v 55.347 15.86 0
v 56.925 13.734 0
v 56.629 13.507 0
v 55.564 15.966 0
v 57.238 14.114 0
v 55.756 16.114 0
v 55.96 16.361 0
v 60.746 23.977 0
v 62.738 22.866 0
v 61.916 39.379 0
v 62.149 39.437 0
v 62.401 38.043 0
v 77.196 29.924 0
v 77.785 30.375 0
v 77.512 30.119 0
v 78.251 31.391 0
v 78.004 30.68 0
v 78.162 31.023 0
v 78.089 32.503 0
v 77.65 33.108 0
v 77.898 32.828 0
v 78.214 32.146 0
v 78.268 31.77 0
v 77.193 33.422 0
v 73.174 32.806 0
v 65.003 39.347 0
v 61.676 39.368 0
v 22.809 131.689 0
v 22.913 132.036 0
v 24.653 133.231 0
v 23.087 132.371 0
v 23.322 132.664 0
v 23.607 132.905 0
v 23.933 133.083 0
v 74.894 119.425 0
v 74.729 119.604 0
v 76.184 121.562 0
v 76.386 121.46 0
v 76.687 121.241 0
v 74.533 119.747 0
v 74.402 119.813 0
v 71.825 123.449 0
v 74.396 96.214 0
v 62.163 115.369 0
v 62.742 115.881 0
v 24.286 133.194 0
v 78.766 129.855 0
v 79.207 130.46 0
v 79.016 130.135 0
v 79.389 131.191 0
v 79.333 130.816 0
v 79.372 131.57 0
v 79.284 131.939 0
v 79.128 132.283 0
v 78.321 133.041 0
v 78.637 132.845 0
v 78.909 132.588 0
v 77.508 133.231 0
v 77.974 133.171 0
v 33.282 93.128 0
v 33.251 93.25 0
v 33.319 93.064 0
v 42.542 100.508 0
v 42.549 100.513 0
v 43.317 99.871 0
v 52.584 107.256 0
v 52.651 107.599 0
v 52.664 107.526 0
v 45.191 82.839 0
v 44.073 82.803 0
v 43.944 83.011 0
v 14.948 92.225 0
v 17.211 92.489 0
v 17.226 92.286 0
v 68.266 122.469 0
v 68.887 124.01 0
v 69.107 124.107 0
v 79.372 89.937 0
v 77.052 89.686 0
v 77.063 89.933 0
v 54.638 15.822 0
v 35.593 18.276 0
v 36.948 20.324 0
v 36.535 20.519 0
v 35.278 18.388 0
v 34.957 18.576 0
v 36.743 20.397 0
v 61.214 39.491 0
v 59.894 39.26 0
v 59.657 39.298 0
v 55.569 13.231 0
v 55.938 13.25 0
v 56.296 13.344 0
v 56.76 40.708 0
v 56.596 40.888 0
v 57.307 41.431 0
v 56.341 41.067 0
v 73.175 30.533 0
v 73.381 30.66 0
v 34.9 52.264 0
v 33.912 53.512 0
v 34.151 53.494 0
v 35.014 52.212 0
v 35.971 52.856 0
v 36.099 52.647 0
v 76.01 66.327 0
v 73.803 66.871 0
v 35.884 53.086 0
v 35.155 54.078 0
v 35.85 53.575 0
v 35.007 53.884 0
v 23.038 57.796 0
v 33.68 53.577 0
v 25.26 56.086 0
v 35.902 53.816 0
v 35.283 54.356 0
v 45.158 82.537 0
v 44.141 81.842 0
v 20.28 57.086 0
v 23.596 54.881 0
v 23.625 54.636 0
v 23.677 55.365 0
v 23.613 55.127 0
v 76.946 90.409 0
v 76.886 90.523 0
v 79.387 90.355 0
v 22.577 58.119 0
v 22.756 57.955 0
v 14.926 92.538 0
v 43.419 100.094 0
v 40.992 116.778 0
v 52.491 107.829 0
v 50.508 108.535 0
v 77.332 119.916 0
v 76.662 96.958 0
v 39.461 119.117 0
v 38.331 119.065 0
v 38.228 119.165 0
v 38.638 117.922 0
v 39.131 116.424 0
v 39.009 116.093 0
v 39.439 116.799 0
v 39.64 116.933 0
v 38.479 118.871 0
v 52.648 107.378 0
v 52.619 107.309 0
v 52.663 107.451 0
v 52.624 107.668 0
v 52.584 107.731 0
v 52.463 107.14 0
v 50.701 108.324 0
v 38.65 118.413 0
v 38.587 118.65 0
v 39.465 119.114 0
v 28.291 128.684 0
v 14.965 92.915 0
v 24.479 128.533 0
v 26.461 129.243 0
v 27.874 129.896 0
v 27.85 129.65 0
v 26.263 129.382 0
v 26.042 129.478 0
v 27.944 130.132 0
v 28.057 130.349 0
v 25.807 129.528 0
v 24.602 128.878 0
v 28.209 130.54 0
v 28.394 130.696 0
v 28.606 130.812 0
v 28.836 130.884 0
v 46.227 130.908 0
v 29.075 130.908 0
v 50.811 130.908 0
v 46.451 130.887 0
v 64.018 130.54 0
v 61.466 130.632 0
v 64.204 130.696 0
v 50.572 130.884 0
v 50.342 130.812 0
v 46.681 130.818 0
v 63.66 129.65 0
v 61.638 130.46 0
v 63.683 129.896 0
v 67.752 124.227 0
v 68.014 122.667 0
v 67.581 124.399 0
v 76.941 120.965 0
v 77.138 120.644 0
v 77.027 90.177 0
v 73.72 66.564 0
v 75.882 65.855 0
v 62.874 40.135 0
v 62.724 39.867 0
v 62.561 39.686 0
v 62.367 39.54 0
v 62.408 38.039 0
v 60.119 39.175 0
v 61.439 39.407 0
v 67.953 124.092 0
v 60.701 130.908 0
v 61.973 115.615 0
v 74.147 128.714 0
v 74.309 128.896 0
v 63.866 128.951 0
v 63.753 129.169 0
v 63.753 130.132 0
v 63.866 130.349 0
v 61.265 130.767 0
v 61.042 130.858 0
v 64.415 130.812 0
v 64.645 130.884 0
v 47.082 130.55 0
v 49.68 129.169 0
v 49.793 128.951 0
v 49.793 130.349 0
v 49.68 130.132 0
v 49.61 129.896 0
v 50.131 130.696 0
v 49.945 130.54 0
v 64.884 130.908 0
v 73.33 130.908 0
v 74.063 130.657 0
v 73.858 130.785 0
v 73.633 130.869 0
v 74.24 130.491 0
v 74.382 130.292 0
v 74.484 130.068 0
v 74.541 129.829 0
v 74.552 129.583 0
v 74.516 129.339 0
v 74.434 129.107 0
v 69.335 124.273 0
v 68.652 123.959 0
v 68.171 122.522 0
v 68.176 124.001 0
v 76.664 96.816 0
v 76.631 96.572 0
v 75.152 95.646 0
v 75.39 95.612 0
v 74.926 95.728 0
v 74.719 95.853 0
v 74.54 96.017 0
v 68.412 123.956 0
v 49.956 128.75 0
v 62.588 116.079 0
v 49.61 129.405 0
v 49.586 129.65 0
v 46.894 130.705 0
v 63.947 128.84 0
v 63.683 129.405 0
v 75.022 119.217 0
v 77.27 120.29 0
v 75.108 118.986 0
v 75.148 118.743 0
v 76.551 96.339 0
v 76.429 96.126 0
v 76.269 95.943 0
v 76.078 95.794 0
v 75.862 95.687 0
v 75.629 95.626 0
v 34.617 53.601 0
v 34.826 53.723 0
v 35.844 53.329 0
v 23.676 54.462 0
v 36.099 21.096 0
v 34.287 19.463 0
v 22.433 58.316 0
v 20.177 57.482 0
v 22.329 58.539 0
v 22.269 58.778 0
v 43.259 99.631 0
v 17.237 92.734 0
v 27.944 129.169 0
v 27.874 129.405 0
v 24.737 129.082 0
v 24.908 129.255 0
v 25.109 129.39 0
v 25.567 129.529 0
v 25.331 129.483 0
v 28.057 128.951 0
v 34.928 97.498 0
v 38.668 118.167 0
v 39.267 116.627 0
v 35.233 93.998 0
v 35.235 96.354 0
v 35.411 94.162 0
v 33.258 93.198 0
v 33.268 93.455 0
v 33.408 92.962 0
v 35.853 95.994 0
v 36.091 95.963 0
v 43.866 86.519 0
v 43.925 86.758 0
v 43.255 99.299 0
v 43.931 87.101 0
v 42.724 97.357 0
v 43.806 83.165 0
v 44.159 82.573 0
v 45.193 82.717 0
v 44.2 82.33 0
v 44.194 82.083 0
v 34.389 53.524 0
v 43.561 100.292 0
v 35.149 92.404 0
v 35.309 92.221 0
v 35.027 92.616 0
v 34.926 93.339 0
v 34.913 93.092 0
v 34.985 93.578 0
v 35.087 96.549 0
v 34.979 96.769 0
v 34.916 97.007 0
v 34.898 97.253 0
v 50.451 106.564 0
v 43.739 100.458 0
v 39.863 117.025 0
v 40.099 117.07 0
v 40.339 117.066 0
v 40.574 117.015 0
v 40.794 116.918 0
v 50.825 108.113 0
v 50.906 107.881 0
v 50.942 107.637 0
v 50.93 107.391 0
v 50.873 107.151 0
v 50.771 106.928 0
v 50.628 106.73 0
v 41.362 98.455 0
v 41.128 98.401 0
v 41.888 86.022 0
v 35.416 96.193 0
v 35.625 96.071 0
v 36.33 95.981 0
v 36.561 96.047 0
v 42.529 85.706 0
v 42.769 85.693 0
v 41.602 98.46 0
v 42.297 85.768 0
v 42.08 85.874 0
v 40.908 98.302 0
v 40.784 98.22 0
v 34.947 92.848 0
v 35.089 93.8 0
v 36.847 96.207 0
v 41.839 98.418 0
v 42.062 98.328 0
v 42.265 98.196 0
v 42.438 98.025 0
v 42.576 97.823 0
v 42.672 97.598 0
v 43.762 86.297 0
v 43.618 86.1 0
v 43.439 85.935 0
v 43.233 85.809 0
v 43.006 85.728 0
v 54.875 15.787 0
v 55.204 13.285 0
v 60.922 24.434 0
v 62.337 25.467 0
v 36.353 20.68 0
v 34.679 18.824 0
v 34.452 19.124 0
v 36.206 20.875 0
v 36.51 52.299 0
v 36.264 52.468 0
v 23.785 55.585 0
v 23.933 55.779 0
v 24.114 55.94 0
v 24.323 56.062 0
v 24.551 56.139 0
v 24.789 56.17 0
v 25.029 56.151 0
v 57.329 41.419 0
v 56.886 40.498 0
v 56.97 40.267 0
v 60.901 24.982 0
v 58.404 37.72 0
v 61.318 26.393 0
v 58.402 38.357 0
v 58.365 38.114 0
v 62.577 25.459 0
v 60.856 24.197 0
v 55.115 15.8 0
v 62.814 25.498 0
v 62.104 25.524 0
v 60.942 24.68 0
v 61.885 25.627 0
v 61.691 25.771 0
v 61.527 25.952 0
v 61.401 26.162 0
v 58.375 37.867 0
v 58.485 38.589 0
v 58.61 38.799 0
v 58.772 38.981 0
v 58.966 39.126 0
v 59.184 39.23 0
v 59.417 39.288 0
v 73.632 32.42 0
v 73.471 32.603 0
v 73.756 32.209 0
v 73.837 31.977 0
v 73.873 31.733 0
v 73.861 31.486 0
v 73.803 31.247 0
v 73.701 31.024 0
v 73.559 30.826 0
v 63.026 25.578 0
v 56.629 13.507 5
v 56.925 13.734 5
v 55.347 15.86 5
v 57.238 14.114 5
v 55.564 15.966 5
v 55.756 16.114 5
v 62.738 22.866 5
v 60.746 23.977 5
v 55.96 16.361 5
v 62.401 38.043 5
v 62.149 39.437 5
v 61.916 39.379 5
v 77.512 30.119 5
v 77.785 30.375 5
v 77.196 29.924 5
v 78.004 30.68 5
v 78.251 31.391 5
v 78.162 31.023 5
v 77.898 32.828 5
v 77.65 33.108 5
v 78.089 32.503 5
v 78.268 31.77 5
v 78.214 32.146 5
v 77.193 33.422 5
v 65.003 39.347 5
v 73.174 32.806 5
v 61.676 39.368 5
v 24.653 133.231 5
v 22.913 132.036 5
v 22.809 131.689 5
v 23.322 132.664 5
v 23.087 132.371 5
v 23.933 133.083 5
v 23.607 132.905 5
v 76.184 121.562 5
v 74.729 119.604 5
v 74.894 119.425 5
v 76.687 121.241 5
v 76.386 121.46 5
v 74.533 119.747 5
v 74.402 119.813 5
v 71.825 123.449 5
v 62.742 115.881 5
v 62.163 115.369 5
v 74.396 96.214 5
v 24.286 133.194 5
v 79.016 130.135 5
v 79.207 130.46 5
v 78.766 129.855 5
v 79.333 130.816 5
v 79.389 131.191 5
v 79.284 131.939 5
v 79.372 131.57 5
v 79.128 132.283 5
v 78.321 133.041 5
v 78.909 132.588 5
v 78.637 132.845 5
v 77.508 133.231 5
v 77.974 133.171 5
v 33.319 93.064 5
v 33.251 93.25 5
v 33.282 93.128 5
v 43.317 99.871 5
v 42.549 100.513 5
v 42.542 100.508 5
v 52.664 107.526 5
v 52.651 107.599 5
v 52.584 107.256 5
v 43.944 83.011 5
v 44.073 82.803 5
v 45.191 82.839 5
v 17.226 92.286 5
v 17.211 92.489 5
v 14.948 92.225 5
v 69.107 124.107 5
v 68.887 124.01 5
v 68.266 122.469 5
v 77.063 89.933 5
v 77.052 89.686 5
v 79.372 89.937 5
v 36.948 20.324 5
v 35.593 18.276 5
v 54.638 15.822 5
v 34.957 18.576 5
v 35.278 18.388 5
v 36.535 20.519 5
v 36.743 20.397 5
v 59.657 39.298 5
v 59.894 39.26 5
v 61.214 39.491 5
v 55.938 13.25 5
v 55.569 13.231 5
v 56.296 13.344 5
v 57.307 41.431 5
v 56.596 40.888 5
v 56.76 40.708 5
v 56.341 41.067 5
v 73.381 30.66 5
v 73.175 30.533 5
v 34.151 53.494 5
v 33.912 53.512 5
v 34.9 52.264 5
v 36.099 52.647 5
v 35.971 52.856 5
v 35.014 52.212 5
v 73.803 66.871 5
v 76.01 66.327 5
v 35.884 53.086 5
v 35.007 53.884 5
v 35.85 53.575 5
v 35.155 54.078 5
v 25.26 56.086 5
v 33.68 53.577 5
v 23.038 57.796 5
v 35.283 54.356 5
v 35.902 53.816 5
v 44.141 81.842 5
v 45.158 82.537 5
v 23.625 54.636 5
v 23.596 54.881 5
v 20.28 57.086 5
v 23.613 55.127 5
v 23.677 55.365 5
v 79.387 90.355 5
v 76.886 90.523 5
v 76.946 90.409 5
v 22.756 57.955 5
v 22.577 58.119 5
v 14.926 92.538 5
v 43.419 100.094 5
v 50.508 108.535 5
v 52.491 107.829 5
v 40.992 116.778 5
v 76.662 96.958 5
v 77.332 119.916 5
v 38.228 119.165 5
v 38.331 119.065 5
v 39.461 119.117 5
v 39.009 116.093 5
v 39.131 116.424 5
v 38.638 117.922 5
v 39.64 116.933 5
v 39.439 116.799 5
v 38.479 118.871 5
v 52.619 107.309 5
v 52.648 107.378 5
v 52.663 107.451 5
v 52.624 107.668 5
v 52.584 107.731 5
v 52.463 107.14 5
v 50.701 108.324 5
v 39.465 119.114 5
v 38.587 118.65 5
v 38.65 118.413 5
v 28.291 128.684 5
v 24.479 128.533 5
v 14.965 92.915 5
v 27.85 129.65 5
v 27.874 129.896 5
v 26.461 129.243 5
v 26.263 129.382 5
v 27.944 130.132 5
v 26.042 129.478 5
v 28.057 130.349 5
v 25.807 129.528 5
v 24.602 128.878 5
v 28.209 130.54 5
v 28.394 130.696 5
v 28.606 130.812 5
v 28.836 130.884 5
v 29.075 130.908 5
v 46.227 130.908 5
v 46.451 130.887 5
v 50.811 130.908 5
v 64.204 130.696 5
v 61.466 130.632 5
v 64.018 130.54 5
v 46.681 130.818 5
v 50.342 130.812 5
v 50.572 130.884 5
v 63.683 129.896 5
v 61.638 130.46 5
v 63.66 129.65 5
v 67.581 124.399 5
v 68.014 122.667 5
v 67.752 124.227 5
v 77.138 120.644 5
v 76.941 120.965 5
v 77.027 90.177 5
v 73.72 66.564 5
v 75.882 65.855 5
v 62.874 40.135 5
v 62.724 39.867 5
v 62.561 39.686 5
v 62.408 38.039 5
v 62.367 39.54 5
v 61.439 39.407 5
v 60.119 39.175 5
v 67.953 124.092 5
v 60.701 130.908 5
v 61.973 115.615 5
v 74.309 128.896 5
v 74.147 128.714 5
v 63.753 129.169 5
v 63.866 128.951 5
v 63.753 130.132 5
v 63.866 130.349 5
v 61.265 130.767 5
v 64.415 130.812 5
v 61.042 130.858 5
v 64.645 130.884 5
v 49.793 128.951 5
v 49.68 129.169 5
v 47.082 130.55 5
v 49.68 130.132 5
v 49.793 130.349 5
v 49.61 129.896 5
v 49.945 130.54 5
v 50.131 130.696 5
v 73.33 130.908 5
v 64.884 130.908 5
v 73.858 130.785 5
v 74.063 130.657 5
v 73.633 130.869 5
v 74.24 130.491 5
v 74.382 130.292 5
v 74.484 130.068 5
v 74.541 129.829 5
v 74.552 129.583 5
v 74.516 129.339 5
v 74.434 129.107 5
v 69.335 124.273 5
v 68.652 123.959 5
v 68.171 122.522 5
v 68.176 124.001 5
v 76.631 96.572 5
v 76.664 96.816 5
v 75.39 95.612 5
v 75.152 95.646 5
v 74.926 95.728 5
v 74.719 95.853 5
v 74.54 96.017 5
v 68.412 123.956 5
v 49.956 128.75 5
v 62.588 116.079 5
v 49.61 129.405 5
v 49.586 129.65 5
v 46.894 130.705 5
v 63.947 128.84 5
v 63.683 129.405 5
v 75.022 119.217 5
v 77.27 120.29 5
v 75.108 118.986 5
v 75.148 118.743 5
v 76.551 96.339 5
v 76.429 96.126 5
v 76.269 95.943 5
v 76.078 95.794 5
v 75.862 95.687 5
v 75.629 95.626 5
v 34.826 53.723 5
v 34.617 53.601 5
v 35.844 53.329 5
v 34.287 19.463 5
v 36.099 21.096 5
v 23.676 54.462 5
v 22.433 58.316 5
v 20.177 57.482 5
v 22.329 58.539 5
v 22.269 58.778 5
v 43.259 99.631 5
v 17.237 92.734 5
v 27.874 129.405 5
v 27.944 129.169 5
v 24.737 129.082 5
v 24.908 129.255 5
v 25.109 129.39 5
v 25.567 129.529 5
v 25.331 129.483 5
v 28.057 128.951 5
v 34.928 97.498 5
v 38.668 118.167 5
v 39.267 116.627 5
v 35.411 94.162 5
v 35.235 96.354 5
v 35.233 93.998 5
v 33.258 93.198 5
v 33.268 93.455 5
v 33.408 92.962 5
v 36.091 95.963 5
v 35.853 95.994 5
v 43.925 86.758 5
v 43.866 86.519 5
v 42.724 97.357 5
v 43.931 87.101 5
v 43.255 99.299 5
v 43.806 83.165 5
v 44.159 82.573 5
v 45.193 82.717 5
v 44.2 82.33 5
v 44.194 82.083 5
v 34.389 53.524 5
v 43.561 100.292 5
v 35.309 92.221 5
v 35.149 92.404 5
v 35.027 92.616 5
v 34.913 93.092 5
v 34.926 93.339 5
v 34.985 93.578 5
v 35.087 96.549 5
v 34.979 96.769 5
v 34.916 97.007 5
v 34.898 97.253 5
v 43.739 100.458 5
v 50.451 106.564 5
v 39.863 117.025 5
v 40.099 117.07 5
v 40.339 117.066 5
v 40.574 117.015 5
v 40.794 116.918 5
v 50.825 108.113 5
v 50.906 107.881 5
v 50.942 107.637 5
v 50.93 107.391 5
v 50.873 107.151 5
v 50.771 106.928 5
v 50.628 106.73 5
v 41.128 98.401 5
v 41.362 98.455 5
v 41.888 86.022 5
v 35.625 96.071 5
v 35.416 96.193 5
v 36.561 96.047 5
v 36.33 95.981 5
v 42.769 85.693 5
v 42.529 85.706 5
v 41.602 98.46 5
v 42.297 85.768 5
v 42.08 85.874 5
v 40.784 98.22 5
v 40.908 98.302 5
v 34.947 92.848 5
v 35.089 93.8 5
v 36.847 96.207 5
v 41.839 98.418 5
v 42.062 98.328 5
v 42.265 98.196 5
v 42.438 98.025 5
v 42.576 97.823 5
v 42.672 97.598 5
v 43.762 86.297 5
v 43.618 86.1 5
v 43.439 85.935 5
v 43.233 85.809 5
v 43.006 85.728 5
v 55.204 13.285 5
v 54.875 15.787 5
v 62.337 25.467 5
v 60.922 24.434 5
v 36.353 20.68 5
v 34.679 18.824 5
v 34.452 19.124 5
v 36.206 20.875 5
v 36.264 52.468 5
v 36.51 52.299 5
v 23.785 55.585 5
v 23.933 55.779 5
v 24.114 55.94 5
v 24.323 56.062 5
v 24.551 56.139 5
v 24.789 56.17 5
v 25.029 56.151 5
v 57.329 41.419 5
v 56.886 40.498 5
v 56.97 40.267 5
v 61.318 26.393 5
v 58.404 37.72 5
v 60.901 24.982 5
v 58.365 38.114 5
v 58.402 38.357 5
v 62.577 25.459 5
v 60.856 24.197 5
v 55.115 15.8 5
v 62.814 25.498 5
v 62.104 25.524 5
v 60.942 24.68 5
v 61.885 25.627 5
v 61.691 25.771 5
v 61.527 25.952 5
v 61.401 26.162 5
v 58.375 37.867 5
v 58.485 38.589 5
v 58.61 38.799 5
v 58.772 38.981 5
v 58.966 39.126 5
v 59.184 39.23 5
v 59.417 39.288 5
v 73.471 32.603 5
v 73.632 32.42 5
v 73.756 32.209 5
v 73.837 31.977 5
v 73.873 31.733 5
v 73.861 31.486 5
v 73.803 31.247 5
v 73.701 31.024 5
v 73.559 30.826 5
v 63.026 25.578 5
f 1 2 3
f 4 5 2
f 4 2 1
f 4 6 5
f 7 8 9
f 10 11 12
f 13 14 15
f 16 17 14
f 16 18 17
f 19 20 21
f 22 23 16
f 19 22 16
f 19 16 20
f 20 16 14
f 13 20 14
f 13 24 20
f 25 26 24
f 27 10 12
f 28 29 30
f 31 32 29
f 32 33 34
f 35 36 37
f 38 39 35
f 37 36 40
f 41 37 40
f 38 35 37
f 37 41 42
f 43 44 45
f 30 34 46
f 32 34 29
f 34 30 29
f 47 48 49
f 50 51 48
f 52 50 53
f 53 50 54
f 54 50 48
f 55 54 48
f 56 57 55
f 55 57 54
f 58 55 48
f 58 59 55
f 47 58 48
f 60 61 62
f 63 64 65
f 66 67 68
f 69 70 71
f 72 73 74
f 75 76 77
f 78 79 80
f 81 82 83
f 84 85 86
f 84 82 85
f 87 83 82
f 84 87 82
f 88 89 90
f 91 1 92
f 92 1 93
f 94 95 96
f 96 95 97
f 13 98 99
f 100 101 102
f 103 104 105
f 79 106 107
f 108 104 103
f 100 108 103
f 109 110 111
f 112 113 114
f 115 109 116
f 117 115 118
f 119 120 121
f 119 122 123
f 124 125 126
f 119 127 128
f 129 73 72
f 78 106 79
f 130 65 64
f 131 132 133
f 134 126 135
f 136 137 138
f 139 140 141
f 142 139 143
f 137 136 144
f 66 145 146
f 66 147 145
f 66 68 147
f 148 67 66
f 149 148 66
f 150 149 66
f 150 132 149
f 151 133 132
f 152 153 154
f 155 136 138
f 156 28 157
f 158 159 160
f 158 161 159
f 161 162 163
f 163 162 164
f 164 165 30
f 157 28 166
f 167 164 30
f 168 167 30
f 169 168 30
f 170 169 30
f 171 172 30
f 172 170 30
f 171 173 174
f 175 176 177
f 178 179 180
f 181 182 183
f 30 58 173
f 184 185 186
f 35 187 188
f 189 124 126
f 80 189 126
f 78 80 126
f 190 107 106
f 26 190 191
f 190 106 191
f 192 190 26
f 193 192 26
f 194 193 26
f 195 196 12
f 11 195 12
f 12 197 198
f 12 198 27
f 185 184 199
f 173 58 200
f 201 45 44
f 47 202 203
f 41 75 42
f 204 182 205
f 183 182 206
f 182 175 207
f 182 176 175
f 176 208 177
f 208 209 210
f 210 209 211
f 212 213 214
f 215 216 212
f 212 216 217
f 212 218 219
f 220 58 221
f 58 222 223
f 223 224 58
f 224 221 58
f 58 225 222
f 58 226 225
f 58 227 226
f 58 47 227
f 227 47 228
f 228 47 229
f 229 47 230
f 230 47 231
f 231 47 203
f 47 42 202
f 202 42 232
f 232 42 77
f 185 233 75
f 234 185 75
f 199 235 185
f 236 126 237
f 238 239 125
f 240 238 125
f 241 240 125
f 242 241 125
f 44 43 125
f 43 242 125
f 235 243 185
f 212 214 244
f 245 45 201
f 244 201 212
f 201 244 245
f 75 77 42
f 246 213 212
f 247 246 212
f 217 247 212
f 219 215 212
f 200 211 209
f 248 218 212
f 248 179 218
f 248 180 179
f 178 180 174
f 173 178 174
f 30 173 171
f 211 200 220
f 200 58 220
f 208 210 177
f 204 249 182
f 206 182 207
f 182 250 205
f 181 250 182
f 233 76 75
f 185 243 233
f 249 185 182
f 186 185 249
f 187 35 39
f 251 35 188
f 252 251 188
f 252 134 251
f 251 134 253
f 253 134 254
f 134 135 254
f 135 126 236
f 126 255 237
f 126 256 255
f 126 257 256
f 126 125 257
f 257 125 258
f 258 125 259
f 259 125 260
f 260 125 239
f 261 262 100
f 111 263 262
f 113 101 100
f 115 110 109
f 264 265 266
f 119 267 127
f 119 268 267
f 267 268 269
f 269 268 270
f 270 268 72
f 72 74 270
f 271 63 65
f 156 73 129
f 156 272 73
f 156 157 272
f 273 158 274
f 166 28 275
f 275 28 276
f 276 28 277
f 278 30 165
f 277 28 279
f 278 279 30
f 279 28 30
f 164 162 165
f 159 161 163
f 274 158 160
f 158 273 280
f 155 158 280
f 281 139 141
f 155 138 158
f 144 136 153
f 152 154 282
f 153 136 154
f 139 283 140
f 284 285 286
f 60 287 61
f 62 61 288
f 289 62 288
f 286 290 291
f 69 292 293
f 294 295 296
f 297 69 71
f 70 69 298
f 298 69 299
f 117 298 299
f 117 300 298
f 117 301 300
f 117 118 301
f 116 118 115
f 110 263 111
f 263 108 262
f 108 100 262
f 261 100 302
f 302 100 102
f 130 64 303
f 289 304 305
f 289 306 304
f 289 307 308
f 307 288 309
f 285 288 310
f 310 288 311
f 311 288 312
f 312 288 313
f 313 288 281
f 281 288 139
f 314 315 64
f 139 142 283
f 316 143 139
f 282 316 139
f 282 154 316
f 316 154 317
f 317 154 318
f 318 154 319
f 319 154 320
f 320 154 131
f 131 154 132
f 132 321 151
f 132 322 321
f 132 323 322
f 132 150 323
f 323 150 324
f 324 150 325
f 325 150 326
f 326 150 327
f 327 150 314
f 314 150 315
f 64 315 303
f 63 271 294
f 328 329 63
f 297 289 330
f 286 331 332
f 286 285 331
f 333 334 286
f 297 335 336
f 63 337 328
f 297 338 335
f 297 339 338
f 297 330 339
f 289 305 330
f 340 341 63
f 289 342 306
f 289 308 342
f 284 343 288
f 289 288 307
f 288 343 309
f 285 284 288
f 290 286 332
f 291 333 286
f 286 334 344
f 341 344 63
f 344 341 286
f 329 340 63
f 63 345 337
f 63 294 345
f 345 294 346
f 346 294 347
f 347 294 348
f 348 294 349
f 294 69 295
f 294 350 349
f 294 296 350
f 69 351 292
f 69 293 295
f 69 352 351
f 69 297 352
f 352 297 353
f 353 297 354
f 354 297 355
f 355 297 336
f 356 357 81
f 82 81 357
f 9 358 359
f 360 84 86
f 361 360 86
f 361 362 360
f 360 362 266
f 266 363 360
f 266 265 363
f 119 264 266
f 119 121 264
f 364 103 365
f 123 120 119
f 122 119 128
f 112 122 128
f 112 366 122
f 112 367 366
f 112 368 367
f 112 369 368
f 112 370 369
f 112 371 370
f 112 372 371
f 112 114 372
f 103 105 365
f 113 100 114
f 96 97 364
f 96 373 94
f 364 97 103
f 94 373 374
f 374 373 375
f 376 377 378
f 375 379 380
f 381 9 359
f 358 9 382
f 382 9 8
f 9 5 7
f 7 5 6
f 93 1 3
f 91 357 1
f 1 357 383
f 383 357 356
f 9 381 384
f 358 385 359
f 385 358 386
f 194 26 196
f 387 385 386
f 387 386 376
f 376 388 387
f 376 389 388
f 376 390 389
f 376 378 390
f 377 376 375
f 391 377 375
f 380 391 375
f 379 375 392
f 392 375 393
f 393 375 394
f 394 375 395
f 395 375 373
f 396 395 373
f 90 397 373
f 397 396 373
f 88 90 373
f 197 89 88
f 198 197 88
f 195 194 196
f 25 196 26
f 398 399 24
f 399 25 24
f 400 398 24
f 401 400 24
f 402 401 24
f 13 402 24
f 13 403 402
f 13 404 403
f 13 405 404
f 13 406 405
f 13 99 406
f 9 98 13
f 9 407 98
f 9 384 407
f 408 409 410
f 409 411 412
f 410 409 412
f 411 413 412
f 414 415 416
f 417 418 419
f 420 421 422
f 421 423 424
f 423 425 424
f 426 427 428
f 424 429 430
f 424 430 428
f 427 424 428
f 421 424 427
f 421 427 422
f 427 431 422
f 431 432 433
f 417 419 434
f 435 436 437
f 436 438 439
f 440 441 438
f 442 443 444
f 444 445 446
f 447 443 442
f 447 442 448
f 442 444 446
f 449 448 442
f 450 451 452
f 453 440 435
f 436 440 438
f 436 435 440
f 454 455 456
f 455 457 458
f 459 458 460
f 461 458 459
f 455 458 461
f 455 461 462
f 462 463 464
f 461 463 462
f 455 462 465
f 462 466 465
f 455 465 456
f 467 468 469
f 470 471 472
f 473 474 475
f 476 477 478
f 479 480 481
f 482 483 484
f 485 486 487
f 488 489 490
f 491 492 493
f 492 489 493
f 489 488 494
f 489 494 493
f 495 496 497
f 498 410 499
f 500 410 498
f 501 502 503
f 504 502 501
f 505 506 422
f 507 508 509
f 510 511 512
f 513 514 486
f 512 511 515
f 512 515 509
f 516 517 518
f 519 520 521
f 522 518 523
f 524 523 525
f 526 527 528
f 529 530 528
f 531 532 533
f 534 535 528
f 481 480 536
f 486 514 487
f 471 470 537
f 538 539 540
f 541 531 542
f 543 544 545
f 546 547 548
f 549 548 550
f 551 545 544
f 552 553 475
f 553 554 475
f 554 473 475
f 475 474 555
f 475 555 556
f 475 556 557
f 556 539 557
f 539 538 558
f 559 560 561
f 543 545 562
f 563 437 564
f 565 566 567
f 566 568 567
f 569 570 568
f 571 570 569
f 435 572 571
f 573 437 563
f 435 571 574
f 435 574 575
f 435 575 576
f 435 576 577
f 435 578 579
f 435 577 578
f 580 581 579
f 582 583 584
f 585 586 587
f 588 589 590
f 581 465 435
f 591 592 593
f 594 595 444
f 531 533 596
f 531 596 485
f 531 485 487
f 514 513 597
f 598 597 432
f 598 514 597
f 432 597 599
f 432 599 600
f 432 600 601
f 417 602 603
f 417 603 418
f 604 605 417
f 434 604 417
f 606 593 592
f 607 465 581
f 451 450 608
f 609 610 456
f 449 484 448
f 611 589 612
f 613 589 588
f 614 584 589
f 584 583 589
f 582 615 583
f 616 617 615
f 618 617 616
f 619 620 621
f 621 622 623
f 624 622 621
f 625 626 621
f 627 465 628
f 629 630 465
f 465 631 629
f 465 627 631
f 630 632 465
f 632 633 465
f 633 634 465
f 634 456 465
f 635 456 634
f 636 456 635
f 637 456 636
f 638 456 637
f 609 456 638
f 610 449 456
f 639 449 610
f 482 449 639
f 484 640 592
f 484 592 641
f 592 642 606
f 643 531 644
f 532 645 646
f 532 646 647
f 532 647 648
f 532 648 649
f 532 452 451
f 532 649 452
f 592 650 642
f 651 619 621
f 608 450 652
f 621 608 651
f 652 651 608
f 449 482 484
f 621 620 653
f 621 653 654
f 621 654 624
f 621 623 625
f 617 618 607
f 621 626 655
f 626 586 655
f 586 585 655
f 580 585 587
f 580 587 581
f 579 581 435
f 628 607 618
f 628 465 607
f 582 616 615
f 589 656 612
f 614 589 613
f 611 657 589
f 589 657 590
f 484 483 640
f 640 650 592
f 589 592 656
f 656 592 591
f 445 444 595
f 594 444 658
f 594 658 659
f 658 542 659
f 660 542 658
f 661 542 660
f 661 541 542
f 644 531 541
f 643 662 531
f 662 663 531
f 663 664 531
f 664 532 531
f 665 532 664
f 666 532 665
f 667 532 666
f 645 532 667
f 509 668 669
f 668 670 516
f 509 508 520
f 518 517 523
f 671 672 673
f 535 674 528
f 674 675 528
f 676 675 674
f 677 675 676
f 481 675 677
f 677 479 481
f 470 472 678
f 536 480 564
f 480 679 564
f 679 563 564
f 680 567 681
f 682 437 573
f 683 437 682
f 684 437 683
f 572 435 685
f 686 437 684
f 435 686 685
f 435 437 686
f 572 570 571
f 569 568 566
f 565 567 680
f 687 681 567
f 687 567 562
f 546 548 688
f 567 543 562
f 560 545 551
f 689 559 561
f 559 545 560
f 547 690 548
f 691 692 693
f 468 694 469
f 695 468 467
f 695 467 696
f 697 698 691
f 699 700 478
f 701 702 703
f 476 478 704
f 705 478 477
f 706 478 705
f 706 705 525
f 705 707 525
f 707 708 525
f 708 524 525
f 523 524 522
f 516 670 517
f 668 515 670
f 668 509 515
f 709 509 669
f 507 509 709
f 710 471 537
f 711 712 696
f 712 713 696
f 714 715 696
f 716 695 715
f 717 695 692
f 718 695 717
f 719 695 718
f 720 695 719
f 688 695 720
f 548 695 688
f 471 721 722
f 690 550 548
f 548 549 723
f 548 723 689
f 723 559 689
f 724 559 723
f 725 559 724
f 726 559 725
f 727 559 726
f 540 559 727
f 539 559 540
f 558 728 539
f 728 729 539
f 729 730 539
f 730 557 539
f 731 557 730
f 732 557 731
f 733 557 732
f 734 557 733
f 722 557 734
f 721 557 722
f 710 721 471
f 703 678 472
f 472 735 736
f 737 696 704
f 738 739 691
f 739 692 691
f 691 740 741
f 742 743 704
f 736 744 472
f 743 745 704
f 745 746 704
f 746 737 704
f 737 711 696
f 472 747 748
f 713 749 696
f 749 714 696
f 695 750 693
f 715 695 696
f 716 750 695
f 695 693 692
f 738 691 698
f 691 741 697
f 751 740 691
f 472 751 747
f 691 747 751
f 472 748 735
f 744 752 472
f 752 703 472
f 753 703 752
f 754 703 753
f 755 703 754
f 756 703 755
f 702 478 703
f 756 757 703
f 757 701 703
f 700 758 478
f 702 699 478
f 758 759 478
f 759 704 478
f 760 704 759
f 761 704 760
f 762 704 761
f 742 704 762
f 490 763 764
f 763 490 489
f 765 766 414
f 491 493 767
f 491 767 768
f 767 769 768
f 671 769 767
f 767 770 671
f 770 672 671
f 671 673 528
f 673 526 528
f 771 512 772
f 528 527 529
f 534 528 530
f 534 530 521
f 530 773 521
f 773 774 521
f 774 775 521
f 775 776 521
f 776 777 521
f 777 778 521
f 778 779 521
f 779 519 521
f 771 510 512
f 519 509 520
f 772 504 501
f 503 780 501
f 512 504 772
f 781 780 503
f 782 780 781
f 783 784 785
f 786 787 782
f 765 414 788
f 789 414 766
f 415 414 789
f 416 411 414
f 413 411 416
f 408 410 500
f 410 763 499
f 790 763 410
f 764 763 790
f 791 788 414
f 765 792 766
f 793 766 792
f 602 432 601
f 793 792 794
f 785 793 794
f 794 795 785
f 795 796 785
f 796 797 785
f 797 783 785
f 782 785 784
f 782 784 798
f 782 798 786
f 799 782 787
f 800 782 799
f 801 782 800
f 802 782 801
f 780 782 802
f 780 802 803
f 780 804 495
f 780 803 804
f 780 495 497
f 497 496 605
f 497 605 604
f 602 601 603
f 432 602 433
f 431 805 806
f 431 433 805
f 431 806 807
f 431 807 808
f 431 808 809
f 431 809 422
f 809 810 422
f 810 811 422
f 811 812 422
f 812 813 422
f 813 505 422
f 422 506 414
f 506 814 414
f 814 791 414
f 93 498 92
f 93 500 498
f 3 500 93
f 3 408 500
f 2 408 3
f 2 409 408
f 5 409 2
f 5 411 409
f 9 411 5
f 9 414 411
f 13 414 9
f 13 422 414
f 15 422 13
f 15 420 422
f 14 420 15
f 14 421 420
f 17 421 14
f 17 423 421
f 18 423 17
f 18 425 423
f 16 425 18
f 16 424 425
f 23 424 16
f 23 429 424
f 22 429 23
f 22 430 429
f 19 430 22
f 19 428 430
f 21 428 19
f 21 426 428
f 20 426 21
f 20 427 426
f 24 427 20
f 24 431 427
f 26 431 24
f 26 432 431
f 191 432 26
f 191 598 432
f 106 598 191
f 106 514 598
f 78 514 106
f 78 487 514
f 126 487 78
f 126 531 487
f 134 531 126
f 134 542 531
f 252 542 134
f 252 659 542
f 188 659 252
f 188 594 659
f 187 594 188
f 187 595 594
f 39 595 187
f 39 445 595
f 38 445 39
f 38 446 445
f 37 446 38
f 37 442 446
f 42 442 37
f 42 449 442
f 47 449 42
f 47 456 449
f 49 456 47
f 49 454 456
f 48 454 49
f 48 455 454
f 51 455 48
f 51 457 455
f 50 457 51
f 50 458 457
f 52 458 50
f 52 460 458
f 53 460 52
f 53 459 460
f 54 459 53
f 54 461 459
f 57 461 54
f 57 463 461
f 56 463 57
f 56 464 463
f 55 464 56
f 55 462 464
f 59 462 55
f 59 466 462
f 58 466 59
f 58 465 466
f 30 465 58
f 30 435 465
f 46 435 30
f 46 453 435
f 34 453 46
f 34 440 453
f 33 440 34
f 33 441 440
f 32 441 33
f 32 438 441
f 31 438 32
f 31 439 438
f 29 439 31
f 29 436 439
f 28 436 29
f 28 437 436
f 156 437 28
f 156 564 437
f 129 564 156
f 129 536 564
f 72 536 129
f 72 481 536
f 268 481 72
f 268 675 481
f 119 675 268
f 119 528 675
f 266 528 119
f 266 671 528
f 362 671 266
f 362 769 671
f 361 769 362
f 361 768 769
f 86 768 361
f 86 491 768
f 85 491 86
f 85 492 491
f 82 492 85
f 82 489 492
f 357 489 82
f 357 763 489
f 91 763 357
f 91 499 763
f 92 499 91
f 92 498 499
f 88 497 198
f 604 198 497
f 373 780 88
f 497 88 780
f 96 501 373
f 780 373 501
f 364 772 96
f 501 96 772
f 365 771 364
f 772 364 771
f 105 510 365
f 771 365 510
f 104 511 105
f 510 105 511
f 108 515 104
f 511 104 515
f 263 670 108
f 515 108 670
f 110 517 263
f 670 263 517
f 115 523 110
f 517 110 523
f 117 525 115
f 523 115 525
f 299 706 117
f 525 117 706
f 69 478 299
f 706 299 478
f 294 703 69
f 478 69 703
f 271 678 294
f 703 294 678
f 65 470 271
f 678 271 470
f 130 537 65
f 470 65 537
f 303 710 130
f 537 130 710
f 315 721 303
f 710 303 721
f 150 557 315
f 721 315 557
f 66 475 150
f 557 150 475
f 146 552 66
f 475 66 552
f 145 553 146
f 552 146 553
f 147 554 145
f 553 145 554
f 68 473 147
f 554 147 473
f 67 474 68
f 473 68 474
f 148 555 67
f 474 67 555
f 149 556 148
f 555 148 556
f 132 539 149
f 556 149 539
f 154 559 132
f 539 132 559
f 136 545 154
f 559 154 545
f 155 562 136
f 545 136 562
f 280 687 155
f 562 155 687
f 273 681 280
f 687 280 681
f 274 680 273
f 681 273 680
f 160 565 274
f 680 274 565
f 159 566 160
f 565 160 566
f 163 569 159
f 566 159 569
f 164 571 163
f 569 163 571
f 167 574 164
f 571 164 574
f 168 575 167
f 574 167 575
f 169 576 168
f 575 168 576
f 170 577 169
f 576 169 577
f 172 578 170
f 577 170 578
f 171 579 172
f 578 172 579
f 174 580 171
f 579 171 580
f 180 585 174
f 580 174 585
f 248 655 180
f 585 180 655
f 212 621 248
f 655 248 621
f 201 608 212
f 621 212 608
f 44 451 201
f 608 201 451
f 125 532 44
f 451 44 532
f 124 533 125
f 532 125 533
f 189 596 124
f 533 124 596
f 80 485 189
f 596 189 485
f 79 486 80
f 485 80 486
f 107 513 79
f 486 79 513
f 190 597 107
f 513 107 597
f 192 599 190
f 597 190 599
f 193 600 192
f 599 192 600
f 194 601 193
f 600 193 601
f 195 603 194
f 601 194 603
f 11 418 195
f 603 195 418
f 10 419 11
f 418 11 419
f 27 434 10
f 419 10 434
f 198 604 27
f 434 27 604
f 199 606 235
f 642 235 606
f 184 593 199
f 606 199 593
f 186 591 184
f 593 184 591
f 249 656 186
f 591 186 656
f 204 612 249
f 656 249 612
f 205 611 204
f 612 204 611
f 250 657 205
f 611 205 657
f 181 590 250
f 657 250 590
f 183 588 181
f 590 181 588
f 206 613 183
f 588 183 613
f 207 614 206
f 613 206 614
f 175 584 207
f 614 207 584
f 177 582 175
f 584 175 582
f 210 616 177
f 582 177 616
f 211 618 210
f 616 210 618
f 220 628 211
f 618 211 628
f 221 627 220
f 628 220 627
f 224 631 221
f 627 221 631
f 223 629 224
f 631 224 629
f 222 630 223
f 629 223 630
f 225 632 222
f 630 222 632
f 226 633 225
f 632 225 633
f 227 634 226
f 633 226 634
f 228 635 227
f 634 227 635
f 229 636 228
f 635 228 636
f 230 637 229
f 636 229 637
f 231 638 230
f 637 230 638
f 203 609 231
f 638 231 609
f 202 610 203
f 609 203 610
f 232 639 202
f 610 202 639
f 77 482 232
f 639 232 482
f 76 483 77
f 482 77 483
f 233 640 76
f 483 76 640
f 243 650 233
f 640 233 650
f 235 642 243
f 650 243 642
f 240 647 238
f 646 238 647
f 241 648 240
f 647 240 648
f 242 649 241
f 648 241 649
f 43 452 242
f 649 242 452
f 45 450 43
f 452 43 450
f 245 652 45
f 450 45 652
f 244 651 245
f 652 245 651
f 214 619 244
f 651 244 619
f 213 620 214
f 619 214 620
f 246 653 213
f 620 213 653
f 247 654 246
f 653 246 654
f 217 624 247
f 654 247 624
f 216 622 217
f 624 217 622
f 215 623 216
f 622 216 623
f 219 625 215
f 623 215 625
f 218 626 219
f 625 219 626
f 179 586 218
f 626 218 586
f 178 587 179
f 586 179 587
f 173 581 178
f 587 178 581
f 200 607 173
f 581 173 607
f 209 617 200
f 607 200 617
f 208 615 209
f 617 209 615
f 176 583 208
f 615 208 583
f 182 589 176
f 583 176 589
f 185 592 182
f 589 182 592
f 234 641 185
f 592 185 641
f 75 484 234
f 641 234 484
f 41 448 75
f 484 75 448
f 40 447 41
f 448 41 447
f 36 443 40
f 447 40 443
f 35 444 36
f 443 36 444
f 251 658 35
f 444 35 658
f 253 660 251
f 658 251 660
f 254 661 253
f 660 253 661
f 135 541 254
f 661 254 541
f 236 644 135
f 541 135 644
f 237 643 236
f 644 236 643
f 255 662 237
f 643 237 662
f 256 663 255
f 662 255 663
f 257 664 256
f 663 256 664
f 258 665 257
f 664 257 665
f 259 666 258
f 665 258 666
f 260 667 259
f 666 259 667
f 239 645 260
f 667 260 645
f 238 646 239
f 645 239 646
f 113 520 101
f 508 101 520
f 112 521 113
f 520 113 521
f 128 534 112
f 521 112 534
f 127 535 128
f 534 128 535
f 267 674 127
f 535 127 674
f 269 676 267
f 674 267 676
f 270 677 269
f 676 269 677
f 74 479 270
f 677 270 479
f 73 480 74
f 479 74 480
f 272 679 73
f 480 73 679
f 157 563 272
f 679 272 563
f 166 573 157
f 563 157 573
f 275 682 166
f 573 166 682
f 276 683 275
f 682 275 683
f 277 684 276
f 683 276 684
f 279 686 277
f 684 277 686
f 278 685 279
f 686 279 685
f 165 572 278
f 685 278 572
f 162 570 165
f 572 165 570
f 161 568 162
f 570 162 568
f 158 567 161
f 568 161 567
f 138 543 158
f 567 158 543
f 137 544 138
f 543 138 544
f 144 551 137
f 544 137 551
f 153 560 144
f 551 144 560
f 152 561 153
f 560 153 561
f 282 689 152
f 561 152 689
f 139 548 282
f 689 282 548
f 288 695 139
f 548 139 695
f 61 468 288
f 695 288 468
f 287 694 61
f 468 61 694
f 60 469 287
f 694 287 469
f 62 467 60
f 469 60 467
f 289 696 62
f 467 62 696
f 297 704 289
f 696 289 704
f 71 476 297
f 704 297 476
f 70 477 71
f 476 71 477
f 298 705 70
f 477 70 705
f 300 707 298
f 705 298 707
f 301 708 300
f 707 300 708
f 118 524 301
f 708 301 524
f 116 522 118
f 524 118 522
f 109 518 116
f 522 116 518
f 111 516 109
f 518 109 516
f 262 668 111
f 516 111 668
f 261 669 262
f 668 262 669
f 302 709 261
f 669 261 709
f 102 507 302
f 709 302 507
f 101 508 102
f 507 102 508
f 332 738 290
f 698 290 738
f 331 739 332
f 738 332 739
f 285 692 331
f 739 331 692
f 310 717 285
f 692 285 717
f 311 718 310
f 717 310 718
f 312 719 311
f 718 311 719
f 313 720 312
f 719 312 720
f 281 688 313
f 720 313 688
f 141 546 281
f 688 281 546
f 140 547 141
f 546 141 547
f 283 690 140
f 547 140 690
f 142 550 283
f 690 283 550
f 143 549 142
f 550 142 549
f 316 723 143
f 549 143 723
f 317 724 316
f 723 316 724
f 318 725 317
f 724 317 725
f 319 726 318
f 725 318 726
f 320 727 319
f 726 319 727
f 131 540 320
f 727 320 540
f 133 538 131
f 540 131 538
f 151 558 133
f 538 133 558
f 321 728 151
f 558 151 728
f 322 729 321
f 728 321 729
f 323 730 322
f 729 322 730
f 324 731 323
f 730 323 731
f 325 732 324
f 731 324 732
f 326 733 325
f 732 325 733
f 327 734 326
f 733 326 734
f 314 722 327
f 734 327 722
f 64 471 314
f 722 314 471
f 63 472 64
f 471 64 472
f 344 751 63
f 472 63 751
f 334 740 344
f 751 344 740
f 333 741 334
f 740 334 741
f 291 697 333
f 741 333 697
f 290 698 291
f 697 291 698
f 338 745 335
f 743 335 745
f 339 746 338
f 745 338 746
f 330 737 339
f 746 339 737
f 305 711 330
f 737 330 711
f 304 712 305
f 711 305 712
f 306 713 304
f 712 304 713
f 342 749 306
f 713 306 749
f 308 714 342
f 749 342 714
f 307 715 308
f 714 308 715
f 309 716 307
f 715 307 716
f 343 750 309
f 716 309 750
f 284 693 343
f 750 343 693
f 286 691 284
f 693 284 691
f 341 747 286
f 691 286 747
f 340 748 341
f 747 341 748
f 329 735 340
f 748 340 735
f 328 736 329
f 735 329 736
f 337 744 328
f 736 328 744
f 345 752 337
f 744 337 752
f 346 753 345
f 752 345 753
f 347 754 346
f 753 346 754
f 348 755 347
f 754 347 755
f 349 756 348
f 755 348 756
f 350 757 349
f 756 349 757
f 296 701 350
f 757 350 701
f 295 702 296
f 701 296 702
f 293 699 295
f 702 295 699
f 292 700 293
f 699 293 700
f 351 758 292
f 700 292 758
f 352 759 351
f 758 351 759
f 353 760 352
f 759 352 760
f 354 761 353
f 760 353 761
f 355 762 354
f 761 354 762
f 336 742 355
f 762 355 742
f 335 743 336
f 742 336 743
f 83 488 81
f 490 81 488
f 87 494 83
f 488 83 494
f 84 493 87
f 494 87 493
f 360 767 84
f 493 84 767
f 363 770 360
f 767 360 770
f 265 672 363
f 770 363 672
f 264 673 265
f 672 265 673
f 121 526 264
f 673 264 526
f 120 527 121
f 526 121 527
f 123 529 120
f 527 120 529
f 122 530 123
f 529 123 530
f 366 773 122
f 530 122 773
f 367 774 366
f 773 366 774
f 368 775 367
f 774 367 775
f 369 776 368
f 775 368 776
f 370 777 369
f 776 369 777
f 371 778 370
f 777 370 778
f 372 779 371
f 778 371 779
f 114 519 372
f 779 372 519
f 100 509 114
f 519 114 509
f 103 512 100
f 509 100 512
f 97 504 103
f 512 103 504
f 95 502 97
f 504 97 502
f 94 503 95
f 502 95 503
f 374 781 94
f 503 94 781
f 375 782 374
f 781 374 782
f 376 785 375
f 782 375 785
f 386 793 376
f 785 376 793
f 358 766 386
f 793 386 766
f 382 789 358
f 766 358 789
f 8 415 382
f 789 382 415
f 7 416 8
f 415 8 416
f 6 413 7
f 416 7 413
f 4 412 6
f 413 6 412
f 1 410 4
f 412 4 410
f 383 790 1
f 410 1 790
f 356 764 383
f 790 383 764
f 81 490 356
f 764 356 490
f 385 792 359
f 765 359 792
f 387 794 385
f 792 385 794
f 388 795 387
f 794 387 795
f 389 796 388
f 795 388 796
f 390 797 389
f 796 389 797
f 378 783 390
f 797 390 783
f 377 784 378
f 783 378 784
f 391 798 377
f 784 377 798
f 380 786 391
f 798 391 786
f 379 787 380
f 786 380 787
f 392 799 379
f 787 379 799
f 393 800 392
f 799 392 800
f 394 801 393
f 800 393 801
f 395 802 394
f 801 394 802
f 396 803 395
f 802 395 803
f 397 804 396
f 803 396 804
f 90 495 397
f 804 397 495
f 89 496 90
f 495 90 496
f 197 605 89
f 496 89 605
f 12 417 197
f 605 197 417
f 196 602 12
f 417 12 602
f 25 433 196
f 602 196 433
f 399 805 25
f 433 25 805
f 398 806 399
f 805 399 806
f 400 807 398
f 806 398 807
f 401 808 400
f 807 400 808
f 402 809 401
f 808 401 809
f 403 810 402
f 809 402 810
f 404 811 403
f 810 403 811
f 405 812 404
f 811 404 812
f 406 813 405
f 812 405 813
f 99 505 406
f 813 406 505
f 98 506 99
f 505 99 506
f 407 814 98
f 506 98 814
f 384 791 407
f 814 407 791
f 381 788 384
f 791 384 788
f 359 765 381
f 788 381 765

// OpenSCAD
/*
 * Customizable Origami - Penguin - https://www.thingiverse.com/thing:2673119
 * by Dennis Hofmann - https://www.thingiverse.com/mightynozzle/about
 * created 2017-11-27
 * version v1.0
 *
 * Changelog
 * --------------
 * v1.0:
 *      - final design
 * --------------
 * 
 * This work is licensed under the Creative Commons - Attribution - NonCommercial - ShareAlike license.
 * https://creativecommons.org/licenses/by-nc-sa/3.0/
 */


 // Parameter Section //
//-------------------//

// preview[view:north, tilt:top]

// The maximum size of the longest side. The shorter side will be automatically resized in same ratio.
max_size_in_millimeter = 120; //[20:300]

// The height of the model.
model_height_in_millimeter = 5; //[0.2:0.2:100]

// Thickness of the outer outline.
outline_size_in_millimeter = 2.4; //[0.5:0.1:20]

// Thickness of the inner outline.
inline_size_in_millimeter = 0.8; //[0.5:0.1:20]

// Roundiness of the ends of the inner outlines.
inline_edge_radius_in_millimeter = 1.3; //[0.0:0.1:5]

// Flip model
flip_model = "no"; //[yes,no]

/*[hidden]*/
max_size = max_size_in_millimeter;
model_height = model_height_in_millimeter;
$fn=32;

// Outer Points
A1 = [132, 684];
A2 = [90, 482];
A3 = [118, 301];
A4 = [193, 105];
A5 = [298, 79];
A6 = [329, 127];
A7 = [409, 165];
A8 = [335, 200];
A9 = [397, 347];
A10 = [415, 470];
A11 = [404, 624];
A12 = [366, 640];
A13 = [415, 684];
A14 = [329, 684];
A15 = [251, 684];

outline = [A1, A2, A3, A4, A5, A6, A7, A8, A9, A10, A11, A12, A13, A14, A15];

// Inner Points
B1 = [180, 486];
B2 = [240, 431];
B3 = [280, 560];
B4 = [210, 619];
B5 = [334, 603];
B6 = [188, 274];
B7 = [306, 214];
B8 = [229, 522];

// Polygons
C1 = [A6, B7, A8, A7];
C2 = [B7, A6, A5, A4, A3, B6];
C3 = [B7, A8, A9, A10, B5, A15, A1, B4, B3, B8, B2, B6];
C4 = [A13, A12, A14];
C5 = [A15, A14, A12, A11, A10, B5];
C6 = [B4, B3, B8, B1];
C7 = [B8, B2, B1];
C8 = [B4, A1, A2, A3, B6, B2, B1];

cut_polygons = [C1, C2, C3, C4, C5, C6, C7, C8];

min_x = A2[0];
min_y = A5[1];
max_x = A10[0];
max_y = A1[1];

x_size = max_x - min_x;
y_size = max_y - min_y;

x_factor = max_size / x_size;
y_factor = max_size / y_size;

inline_size = x_size > y_size ? inline_size_in_millimeter / x_factor / 2: inline_size_in_millimeter / y_factor / 2;
inline_edge_radius = x_size > y_size ? inline_edge_radius_in_millimeter / x_factor: inline_edge_radius_in_millimeter / y_factor;
outline_size = x_size > y_size ? outline_size_in_millimeter / x_factor - inline_size: outline_size_in_millimeter / y_factor - inline_size;


 // Program Section //
//-----------------//

if(x_size > y_size) {
    resize(newsize=[max_size, x_factor * y_size, model_height]){
        if(flip_model == "yes") {
            mirror([0,1,0]) {
                rotate([180,180,0]) {    
                    create(outline, cut_polygons);
                }
            }
        } else {
            create(outline, cut_polygons);
        }
    }
} else {
    resize(newsize=[y_factor * x_size, max_size, model_height]){
        if(flip_model == "yes") {
            mirror([0,1,0]) {
                rotate([180,180,0]) {    
                    create(outline, cut_polygons);
                }
            }
        } else {
            create(outline, cut_polygons);
        }
    }
}


 // Module Section //
//----------------//

module create() {
    linear_extrude(height=1) {
        difference() {
            offset(r = -0) {
                offset(r = +outline_size) {
                    polygon(points = outline, convexity = 10);
                }
            }
            
            for(cut_polygon = [0:len(cut_polygons)]) {
                offset(r = +inline_edge_radius) {
                    offset(r = -inline_size - inline_edge_radius) {
                        polygon(points = cut_polygons[cut_polygon], convexity = 10);
                    }
                }
            }
        }
    }
}
